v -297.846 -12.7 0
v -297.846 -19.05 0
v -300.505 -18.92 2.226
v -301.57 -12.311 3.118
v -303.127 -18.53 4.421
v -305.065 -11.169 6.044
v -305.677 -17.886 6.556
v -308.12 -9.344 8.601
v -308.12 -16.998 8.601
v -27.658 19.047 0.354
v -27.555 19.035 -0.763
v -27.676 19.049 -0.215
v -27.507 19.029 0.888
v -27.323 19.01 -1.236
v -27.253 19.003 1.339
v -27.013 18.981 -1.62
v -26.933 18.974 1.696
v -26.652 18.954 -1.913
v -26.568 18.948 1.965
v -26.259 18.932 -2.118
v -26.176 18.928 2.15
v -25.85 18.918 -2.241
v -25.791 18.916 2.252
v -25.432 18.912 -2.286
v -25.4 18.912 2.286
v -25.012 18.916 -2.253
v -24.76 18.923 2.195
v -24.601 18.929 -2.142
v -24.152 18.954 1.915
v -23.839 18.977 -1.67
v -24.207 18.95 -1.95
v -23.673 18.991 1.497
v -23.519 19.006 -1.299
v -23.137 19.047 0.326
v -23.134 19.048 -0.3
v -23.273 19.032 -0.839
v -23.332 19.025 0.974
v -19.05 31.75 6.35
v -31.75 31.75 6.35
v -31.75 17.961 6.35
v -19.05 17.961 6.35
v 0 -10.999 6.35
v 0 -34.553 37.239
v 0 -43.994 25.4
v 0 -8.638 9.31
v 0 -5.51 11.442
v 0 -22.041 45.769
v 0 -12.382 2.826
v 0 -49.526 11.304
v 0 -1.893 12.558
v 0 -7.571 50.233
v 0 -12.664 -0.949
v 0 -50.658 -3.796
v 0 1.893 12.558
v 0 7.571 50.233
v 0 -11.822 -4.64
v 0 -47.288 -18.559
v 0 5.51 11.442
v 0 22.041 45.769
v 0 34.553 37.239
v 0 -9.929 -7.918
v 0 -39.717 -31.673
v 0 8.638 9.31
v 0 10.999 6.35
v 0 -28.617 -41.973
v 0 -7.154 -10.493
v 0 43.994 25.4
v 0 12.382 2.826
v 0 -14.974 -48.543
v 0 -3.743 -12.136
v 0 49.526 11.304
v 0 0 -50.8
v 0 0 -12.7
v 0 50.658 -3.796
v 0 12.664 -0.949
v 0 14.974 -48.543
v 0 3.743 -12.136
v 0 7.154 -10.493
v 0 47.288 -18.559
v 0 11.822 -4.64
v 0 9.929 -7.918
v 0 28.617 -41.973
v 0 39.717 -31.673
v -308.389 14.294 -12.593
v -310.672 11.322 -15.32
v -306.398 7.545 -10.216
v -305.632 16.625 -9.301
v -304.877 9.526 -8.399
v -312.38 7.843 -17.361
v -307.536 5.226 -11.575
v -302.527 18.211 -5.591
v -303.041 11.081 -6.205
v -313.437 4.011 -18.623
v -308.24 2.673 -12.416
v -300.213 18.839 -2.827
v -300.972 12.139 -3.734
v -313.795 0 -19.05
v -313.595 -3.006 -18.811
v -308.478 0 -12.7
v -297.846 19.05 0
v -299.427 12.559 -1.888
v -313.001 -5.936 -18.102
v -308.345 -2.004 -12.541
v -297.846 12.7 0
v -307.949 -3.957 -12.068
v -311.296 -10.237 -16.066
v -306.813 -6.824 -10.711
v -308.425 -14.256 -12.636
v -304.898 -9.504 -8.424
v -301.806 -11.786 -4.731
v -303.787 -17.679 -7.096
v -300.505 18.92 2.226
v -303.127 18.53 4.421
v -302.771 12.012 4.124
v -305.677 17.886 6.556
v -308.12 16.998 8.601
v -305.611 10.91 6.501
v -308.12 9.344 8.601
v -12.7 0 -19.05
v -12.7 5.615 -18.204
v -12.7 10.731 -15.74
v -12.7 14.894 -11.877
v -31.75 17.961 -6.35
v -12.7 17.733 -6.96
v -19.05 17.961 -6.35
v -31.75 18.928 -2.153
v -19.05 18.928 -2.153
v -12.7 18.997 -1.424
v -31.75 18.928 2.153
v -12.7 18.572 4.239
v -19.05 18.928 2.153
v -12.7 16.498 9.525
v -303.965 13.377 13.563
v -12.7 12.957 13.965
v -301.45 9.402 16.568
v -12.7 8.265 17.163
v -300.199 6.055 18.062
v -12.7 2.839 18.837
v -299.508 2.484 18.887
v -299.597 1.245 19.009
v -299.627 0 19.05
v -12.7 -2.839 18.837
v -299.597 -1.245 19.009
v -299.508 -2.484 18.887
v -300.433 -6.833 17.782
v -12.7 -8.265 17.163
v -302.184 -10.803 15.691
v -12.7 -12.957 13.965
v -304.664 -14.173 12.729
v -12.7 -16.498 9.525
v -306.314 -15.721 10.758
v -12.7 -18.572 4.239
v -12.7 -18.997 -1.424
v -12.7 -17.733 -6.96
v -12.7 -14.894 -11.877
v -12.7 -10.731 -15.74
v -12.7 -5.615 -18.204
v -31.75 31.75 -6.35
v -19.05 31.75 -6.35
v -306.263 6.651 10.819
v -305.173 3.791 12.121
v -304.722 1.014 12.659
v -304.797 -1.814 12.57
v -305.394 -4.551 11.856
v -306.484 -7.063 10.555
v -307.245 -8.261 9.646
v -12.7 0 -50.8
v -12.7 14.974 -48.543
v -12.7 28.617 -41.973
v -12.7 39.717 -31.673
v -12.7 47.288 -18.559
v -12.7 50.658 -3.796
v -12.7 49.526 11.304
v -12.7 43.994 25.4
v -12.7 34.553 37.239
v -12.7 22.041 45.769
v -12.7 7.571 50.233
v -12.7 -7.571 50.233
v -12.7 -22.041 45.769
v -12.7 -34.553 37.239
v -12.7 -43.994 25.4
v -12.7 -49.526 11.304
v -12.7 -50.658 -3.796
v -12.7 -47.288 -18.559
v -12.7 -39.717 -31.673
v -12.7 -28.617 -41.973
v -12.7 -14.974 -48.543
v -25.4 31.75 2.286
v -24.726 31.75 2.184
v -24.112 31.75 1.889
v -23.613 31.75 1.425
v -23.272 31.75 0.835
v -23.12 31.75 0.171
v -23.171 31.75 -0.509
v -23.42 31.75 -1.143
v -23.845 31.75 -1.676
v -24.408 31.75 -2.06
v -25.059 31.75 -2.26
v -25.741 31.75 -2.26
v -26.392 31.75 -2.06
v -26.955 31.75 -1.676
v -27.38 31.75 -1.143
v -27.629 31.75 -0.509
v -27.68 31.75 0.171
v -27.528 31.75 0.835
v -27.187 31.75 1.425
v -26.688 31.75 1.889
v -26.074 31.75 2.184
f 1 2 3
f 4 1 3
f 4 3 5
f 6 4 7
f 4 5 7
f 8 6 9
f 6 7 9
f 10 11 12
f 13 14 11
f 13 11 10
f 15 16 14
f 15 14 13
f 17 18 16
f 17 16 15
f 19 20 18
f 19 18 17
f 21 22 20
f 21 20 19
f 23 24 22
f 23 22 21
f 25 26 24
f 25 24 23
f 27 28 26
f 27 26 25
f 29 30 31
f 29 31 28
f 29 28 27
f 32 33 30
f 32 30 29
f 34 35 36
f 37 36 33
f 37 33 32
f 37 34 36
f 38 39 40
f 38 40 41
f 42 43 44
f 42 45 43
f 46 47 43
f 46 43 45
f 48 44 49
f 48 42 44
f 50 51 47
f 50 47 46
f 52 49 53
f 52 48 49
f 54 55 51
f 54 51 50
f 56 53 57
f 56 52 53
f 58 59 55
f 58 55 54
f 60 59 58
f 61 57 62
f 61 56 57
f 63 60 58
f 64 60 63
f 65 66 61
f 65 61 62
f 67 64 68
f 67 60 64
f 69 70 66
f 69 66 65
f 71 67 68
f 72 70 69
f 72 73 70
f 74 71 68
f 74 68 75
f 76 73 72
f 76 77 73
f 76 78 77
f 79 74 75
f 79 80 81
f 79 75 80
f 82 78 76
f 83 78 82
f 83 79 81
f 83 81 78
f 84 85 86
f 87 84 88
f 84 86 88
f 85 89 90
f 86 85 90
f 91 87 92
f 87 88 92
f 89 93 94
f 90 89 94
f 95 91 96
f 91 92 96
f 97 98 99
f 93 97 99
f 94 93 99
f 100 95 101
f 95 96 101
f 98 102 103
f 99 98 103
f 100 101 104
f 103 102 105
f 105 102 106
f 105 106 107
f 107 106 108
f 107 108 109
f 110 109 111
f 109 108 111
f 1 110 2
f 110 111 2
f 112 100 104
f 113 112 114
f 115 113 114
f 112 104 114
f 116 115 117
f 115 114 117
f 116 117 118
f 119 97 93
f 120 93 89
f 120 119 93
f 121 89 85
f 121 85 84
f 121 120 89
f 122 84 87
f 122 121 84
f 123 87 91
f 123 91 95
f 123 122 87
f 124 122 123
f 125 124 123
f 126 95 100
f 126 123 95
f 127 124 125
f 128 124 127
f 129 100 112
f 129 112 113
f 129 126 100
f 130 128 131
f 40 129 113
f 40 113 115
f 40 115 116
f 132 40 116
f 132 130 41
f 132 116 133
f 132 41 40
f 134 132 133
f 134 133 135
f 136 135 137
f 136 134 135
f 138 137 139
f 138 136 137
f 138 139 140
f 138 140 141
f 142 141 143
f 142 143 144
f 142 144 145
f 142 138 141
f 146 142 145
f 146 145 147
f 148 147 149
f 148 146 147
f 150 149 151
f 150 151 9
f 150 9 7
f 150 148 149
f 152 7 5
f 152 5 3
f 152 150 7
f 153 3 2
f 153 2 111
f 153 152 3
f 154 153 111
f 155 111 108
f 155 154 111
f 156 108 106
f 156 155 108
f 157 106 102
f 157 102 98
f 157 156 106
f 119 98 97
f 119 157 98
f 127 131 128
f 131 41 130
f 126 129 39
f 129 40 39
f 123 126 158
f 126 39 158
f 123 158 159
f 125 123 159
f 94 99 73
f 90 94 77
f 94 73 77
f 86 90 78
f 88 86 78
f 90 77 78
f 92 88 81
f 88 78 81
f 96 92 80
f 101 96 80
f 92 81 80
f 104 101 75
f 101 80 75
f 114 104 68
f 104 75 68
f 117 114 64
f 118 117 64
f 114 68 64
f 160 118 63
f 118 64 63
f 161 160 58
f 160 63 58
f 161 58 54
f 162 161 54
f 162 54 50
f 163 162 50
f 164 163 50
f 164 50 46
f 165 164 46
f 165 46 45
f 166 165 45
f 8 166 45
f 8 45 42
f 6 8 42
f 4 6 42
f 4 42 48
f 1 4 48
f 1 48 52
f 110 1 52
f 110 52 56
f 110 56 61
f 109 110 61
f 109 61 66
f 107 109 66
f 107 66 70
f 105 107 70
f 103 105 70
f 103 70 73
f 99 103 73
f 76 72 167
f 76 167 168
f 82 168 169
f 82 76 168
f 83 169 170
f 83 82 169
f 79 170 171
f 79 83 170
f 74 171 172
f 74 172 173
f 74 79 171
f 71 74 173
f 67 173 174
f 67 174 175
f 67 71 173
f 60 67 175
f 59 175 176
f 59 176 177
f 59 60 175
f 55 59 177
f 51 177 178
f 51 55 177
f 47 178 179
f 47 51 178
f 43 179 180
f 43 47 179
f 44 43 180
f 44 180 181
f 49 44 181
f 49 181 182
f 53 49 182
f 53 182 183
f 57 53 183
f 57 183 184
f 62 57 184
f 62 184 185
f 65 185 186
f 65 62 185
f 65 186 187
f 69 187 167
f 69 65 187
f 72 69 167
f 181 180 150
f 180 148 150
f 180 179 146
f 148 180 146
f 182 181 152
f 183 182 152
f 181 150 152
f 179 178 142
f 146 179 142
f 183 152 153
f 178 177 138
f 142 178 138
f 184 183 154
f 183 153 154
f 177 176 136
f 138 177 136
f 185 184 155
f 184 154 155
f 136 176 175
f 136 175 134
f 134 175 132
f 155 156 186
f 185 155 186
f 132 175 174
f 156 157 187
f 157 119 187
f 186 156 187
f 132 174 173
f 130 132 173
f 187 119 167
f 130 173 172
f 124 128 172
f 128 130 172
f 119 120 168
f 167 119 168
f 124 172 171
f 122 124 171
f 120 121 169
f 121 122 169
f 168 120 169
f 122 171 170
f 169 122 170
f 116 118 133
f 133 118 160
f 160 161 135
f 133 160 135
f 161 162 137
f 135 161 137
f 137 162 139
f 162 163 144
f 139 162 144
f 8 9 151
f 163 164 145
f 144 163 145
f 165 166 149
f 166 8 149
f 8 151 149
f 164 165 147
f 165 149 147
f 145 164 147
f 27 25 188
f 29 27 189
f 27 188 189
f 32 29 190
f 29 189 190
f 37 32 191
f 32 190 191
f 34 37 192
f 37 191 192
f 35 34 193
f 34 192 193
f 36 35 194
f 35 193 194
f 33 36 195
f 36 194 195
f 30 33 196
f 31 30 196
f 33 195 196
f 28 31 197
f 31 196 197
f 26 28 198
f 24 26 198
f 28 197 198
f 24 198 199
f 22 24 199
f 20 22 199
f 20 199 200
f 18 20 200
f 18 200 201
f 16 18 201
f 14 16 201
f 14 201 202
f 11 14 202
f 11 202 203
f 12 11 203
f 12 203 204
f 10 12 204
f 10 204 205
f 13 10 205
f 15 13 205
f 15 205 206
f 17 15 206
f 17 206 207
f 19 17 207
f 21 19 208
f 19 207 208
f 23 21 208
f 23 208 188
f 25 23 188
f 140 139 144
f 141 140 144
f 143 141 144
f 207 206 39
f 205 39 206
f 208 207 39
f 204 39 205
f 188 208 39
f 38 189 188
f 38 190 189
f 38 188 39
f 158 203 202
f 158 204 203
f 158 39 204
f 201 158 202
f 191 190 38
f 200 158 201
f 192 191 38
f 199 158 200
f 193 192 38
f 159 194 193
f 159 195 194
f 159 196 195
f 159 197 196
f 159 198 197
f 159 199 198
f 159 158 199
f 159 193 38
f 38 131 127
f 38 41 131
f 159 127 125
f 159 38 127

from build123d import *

# Parameters (mm, degrees)
SKETCH1_R                = 19.05
SKETCH1_R_2              = 12.7
BOSS_EXTRUDE1_DEPTH      = 381
SKETCH2_R                = 50.8
SKETCH2_R_2              = 12.7
BOSS_EXTRUDE2_DEPTH      = 12.7
CUT_EXTRUDE1_DEPTH       = 388.714173071
CUT_EXTRUDE1_DEPTH_BACK  = 388.714173071
BOSS_EXTRUDE3_REACH      = 355.664
BOSS_EXTRUDE3_END_RADIUS = 19.05
BOSS_EXTRUDE3_START      = 31.75
SKETCH4_W                = 12.7
SKETCH4_H                = 12.7
SKETCH4_R                = 2.286


with BuildPart() as part:
    # Sketch1 → Boss-Extrude1 (new body)
    with BuildSketch(Plane(origin=(0, 0, 0), x_dir=(0, 0, -1), z_dir=(1, 0, 0))):
        Circle(SKETCH1_R)
        Circle(SKETCH1_R_2, mode=Mode.SUBTRACT)
    extrude(amount=-BOSS_EXTRUDE1_DEPTH)

    # Sketch2 → Boss-Extrude2 (add)
    with BuildSketch(Plane(origin=(0, 0, 0), x_dir=(0, 0, -1), z_dir=(1, 0, 0))):
        Circle(SKETCH2_R)
        Circle(SKETCH2_R_2, mode=Mode.SUBTRACT)
    extrude(amount=-BOSS_EXTRUDE2_DEPTH)

    # Sketch3 → Cut-Extrude1 (cut, two sides: drawn at the far end of the back side and taken through both)
    with BuildSketch(Plane(origin=(0, 0, 0), x_dir=(1, 0, 0), z_dir=(0, 1, 0)).offset(-CUT_EXTRUDE1_DEPTH_BACK)):
        Polygon((-330.049521684, 38.465573285), (-297.845785911, 0), (-308.119579729, -8.601315755), (-299.508024312, -18.88734028), (-330.049521684, -60.531095944), (-403.402475389, -60.531095944), (-403.402475389, 38.465573285), align=None)
    extrude(amount=CUT_EXTRUDE1_DEPTH + CUT_EXTRUDE1_DEPTH_BACK, mode=Mode.SUBTRACT)

    # Boss-Extrude3: up to this cylinder (the profile starts outside it)
    boss_extrude3_end = Plane(origin=(-25.4, 0, 0), z_dir=(1, 0, 0)) * Cylinder(BOSS_EXTRUDE3_END_RADIUS, 750.428, mode=Mode.PRIVATE)
    # Sketch4 → Boss-Extrude3 (add, up to the surface)
    with BuildSketch(Plane(origin=(0, 0, 0), x_dir=(1, 0, 0), z_dir=(0, 1, 0)).offset(BOSS_EXTRUDE3_START), mode=Mode.PRIVATE) as boss_extrude3_sk1:
        with Locations((-25.4, 0)):
            Rectangle(SKETCH4_W, SKETCH4_H)
        with Locations(Location((-25.4, 0, 0), (0, 0, 270))):
            Circle(SKETCH4_R, mode=Mode.SUBTRACT)
    boss_extrude3_tool1 = extrude(boss_extrude3_sk1.sketch, amount=-BOSS_EXTRUDE3_REACH, mode=Mode.PRIVATE) - boss_extrude3_end
    add(boss_extrude3_tool1.solids().sort_by_distance((-25.4, 31.75, 6.170395))[0])


solid = part.part
